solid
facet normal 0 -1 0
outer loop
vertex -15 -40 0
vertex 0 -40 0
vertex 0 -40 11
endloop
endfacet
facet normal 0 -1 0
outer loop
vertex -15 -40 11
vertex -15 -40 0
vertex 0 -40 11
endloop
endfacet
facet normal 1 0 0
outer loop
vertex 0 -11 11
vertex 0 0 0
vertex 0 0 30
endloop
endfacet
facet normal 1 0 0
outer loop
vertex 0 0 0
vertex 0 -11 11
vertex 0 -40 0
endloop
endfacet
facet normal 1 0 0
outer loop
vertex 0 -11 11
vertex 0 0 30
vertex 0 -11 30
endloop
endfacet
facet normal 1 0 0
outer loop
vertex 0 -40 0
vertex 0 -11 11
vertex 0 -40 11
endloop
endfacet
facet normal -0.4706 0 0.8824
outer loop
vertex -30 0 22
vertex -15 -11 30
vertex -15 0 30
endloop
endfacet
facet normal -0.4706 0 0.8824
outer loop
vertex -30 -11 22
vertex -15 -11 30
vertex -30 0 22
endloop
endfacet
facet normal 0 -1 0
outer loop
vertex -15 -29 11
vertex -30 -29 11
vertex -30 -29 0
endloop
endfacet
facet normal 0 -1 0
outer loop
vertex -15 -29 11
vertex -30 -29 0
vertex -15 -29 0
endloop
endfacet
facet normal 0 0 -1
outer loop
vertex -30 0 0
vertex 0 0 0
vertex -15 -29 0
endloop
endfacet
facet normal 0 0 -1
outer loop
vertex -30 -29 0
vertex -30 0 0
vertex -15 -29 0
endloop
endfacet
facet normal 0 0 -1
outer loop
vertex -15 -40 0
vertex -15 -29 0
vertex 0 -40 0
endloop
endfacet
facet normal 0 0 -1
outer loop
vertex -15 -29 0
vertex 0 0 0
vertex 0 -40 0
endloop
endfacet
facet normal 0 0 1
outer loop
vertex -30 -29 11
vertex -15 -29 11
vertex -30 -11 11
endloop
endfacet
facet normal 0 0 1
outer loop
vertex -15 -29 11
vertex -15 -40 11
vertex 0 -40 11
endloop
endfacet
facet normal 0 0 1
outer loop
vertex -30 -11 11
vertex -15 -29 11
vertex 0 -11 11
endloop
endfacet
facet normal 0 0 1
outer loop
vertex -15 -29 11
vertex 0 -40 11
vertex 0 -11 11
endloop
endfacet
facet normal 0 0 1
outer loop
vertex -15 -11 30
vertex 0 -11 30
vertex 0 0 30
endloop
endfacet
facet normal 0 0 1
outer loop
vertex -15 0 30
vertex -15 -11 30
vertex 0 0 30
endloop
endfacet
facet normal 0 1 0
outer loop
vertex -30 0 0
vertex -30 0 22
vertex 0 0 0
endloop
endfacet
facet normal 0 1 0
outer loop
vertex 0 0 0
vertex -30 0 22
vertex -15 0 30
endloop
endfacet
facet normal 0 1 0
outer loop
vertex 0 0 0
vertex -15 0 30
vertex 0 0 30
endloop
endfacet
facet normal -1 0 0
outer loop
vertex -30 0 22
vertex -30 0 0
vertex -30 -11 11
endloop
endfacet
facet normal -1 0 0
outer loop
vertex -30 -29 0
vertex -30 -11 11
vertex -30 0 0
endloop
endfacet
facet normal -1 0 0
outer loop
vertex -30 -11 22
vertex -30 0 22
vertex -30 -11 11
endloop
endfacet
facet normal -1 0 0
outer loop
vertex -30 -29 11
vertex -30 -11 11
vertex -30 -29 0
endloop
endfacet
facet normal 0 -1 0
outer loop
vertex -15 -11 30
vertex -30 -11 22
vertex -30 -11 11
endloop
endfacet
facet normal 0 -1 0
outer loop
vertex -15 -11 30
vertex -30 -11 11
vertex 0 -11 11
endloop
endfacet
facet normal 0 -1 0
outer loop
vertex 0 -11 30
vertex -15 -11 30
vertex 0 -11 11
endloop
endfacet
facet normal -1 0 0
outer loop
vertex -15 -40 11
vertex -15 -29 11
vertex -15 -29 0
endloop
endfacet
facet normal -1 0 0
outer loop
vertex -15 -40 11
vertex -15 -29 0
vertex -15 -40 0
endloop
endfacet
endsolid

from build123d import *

# Parameters (mm, degrees)
F1_DEPTH = 30
F2_W     = 11
F2_H     = 15
F3_DEPTH = 11
F4_W     = 15
F4_H     = 8
F5_DEPTH = 11
F6_ANGLE = -90
F8_DEPTH = 11


with BuildPart() as f1:
    # F0 (on Front) → F1 (new body)
    with BuildSketch(Plane.XZ):
        Polygon((0, 30), (0, 0), (40, 0), (40, 11), (11, 11), (11, 30), align=None)
    extrude(amount=F1_DEPTH)

    # F2 (on face) → F3 (cut, through all)
    with BuildSketch(Plane.XY.offset(11)):
        with Locations((34.5, -22.5)):
            Rectangle(F2_W, F2_H)
    extrude(amount=-F3_DEPTH, mode=Mode.SUBTRACT)

    # F4 (on face) → F5 (cut, through all)
    with BuildSketch(Plane.YZ.offset(11)):
        with Locations((-22.5, 26)):
            Rectangle(F4_W, F4_H)
    extrude(amount=-F5_DEPTH, mode=Mode.SUBTRACT)


with BuildPart() as f1_1:
    # F6: moved
    add(f1.part.rotate(Axis((0, 0, 15), (0, 0, 1)), F6_ANGLE))

    # F7 (on face) → F8 (join, through all)
    with BuildSketch(Plane.XZ.offset(11)):
        Polygon((-15, 22), (-15, 30), (-30, 22), align=None)
    extrude(amount=-F8_DEPTH)


solid = f1_1.part
